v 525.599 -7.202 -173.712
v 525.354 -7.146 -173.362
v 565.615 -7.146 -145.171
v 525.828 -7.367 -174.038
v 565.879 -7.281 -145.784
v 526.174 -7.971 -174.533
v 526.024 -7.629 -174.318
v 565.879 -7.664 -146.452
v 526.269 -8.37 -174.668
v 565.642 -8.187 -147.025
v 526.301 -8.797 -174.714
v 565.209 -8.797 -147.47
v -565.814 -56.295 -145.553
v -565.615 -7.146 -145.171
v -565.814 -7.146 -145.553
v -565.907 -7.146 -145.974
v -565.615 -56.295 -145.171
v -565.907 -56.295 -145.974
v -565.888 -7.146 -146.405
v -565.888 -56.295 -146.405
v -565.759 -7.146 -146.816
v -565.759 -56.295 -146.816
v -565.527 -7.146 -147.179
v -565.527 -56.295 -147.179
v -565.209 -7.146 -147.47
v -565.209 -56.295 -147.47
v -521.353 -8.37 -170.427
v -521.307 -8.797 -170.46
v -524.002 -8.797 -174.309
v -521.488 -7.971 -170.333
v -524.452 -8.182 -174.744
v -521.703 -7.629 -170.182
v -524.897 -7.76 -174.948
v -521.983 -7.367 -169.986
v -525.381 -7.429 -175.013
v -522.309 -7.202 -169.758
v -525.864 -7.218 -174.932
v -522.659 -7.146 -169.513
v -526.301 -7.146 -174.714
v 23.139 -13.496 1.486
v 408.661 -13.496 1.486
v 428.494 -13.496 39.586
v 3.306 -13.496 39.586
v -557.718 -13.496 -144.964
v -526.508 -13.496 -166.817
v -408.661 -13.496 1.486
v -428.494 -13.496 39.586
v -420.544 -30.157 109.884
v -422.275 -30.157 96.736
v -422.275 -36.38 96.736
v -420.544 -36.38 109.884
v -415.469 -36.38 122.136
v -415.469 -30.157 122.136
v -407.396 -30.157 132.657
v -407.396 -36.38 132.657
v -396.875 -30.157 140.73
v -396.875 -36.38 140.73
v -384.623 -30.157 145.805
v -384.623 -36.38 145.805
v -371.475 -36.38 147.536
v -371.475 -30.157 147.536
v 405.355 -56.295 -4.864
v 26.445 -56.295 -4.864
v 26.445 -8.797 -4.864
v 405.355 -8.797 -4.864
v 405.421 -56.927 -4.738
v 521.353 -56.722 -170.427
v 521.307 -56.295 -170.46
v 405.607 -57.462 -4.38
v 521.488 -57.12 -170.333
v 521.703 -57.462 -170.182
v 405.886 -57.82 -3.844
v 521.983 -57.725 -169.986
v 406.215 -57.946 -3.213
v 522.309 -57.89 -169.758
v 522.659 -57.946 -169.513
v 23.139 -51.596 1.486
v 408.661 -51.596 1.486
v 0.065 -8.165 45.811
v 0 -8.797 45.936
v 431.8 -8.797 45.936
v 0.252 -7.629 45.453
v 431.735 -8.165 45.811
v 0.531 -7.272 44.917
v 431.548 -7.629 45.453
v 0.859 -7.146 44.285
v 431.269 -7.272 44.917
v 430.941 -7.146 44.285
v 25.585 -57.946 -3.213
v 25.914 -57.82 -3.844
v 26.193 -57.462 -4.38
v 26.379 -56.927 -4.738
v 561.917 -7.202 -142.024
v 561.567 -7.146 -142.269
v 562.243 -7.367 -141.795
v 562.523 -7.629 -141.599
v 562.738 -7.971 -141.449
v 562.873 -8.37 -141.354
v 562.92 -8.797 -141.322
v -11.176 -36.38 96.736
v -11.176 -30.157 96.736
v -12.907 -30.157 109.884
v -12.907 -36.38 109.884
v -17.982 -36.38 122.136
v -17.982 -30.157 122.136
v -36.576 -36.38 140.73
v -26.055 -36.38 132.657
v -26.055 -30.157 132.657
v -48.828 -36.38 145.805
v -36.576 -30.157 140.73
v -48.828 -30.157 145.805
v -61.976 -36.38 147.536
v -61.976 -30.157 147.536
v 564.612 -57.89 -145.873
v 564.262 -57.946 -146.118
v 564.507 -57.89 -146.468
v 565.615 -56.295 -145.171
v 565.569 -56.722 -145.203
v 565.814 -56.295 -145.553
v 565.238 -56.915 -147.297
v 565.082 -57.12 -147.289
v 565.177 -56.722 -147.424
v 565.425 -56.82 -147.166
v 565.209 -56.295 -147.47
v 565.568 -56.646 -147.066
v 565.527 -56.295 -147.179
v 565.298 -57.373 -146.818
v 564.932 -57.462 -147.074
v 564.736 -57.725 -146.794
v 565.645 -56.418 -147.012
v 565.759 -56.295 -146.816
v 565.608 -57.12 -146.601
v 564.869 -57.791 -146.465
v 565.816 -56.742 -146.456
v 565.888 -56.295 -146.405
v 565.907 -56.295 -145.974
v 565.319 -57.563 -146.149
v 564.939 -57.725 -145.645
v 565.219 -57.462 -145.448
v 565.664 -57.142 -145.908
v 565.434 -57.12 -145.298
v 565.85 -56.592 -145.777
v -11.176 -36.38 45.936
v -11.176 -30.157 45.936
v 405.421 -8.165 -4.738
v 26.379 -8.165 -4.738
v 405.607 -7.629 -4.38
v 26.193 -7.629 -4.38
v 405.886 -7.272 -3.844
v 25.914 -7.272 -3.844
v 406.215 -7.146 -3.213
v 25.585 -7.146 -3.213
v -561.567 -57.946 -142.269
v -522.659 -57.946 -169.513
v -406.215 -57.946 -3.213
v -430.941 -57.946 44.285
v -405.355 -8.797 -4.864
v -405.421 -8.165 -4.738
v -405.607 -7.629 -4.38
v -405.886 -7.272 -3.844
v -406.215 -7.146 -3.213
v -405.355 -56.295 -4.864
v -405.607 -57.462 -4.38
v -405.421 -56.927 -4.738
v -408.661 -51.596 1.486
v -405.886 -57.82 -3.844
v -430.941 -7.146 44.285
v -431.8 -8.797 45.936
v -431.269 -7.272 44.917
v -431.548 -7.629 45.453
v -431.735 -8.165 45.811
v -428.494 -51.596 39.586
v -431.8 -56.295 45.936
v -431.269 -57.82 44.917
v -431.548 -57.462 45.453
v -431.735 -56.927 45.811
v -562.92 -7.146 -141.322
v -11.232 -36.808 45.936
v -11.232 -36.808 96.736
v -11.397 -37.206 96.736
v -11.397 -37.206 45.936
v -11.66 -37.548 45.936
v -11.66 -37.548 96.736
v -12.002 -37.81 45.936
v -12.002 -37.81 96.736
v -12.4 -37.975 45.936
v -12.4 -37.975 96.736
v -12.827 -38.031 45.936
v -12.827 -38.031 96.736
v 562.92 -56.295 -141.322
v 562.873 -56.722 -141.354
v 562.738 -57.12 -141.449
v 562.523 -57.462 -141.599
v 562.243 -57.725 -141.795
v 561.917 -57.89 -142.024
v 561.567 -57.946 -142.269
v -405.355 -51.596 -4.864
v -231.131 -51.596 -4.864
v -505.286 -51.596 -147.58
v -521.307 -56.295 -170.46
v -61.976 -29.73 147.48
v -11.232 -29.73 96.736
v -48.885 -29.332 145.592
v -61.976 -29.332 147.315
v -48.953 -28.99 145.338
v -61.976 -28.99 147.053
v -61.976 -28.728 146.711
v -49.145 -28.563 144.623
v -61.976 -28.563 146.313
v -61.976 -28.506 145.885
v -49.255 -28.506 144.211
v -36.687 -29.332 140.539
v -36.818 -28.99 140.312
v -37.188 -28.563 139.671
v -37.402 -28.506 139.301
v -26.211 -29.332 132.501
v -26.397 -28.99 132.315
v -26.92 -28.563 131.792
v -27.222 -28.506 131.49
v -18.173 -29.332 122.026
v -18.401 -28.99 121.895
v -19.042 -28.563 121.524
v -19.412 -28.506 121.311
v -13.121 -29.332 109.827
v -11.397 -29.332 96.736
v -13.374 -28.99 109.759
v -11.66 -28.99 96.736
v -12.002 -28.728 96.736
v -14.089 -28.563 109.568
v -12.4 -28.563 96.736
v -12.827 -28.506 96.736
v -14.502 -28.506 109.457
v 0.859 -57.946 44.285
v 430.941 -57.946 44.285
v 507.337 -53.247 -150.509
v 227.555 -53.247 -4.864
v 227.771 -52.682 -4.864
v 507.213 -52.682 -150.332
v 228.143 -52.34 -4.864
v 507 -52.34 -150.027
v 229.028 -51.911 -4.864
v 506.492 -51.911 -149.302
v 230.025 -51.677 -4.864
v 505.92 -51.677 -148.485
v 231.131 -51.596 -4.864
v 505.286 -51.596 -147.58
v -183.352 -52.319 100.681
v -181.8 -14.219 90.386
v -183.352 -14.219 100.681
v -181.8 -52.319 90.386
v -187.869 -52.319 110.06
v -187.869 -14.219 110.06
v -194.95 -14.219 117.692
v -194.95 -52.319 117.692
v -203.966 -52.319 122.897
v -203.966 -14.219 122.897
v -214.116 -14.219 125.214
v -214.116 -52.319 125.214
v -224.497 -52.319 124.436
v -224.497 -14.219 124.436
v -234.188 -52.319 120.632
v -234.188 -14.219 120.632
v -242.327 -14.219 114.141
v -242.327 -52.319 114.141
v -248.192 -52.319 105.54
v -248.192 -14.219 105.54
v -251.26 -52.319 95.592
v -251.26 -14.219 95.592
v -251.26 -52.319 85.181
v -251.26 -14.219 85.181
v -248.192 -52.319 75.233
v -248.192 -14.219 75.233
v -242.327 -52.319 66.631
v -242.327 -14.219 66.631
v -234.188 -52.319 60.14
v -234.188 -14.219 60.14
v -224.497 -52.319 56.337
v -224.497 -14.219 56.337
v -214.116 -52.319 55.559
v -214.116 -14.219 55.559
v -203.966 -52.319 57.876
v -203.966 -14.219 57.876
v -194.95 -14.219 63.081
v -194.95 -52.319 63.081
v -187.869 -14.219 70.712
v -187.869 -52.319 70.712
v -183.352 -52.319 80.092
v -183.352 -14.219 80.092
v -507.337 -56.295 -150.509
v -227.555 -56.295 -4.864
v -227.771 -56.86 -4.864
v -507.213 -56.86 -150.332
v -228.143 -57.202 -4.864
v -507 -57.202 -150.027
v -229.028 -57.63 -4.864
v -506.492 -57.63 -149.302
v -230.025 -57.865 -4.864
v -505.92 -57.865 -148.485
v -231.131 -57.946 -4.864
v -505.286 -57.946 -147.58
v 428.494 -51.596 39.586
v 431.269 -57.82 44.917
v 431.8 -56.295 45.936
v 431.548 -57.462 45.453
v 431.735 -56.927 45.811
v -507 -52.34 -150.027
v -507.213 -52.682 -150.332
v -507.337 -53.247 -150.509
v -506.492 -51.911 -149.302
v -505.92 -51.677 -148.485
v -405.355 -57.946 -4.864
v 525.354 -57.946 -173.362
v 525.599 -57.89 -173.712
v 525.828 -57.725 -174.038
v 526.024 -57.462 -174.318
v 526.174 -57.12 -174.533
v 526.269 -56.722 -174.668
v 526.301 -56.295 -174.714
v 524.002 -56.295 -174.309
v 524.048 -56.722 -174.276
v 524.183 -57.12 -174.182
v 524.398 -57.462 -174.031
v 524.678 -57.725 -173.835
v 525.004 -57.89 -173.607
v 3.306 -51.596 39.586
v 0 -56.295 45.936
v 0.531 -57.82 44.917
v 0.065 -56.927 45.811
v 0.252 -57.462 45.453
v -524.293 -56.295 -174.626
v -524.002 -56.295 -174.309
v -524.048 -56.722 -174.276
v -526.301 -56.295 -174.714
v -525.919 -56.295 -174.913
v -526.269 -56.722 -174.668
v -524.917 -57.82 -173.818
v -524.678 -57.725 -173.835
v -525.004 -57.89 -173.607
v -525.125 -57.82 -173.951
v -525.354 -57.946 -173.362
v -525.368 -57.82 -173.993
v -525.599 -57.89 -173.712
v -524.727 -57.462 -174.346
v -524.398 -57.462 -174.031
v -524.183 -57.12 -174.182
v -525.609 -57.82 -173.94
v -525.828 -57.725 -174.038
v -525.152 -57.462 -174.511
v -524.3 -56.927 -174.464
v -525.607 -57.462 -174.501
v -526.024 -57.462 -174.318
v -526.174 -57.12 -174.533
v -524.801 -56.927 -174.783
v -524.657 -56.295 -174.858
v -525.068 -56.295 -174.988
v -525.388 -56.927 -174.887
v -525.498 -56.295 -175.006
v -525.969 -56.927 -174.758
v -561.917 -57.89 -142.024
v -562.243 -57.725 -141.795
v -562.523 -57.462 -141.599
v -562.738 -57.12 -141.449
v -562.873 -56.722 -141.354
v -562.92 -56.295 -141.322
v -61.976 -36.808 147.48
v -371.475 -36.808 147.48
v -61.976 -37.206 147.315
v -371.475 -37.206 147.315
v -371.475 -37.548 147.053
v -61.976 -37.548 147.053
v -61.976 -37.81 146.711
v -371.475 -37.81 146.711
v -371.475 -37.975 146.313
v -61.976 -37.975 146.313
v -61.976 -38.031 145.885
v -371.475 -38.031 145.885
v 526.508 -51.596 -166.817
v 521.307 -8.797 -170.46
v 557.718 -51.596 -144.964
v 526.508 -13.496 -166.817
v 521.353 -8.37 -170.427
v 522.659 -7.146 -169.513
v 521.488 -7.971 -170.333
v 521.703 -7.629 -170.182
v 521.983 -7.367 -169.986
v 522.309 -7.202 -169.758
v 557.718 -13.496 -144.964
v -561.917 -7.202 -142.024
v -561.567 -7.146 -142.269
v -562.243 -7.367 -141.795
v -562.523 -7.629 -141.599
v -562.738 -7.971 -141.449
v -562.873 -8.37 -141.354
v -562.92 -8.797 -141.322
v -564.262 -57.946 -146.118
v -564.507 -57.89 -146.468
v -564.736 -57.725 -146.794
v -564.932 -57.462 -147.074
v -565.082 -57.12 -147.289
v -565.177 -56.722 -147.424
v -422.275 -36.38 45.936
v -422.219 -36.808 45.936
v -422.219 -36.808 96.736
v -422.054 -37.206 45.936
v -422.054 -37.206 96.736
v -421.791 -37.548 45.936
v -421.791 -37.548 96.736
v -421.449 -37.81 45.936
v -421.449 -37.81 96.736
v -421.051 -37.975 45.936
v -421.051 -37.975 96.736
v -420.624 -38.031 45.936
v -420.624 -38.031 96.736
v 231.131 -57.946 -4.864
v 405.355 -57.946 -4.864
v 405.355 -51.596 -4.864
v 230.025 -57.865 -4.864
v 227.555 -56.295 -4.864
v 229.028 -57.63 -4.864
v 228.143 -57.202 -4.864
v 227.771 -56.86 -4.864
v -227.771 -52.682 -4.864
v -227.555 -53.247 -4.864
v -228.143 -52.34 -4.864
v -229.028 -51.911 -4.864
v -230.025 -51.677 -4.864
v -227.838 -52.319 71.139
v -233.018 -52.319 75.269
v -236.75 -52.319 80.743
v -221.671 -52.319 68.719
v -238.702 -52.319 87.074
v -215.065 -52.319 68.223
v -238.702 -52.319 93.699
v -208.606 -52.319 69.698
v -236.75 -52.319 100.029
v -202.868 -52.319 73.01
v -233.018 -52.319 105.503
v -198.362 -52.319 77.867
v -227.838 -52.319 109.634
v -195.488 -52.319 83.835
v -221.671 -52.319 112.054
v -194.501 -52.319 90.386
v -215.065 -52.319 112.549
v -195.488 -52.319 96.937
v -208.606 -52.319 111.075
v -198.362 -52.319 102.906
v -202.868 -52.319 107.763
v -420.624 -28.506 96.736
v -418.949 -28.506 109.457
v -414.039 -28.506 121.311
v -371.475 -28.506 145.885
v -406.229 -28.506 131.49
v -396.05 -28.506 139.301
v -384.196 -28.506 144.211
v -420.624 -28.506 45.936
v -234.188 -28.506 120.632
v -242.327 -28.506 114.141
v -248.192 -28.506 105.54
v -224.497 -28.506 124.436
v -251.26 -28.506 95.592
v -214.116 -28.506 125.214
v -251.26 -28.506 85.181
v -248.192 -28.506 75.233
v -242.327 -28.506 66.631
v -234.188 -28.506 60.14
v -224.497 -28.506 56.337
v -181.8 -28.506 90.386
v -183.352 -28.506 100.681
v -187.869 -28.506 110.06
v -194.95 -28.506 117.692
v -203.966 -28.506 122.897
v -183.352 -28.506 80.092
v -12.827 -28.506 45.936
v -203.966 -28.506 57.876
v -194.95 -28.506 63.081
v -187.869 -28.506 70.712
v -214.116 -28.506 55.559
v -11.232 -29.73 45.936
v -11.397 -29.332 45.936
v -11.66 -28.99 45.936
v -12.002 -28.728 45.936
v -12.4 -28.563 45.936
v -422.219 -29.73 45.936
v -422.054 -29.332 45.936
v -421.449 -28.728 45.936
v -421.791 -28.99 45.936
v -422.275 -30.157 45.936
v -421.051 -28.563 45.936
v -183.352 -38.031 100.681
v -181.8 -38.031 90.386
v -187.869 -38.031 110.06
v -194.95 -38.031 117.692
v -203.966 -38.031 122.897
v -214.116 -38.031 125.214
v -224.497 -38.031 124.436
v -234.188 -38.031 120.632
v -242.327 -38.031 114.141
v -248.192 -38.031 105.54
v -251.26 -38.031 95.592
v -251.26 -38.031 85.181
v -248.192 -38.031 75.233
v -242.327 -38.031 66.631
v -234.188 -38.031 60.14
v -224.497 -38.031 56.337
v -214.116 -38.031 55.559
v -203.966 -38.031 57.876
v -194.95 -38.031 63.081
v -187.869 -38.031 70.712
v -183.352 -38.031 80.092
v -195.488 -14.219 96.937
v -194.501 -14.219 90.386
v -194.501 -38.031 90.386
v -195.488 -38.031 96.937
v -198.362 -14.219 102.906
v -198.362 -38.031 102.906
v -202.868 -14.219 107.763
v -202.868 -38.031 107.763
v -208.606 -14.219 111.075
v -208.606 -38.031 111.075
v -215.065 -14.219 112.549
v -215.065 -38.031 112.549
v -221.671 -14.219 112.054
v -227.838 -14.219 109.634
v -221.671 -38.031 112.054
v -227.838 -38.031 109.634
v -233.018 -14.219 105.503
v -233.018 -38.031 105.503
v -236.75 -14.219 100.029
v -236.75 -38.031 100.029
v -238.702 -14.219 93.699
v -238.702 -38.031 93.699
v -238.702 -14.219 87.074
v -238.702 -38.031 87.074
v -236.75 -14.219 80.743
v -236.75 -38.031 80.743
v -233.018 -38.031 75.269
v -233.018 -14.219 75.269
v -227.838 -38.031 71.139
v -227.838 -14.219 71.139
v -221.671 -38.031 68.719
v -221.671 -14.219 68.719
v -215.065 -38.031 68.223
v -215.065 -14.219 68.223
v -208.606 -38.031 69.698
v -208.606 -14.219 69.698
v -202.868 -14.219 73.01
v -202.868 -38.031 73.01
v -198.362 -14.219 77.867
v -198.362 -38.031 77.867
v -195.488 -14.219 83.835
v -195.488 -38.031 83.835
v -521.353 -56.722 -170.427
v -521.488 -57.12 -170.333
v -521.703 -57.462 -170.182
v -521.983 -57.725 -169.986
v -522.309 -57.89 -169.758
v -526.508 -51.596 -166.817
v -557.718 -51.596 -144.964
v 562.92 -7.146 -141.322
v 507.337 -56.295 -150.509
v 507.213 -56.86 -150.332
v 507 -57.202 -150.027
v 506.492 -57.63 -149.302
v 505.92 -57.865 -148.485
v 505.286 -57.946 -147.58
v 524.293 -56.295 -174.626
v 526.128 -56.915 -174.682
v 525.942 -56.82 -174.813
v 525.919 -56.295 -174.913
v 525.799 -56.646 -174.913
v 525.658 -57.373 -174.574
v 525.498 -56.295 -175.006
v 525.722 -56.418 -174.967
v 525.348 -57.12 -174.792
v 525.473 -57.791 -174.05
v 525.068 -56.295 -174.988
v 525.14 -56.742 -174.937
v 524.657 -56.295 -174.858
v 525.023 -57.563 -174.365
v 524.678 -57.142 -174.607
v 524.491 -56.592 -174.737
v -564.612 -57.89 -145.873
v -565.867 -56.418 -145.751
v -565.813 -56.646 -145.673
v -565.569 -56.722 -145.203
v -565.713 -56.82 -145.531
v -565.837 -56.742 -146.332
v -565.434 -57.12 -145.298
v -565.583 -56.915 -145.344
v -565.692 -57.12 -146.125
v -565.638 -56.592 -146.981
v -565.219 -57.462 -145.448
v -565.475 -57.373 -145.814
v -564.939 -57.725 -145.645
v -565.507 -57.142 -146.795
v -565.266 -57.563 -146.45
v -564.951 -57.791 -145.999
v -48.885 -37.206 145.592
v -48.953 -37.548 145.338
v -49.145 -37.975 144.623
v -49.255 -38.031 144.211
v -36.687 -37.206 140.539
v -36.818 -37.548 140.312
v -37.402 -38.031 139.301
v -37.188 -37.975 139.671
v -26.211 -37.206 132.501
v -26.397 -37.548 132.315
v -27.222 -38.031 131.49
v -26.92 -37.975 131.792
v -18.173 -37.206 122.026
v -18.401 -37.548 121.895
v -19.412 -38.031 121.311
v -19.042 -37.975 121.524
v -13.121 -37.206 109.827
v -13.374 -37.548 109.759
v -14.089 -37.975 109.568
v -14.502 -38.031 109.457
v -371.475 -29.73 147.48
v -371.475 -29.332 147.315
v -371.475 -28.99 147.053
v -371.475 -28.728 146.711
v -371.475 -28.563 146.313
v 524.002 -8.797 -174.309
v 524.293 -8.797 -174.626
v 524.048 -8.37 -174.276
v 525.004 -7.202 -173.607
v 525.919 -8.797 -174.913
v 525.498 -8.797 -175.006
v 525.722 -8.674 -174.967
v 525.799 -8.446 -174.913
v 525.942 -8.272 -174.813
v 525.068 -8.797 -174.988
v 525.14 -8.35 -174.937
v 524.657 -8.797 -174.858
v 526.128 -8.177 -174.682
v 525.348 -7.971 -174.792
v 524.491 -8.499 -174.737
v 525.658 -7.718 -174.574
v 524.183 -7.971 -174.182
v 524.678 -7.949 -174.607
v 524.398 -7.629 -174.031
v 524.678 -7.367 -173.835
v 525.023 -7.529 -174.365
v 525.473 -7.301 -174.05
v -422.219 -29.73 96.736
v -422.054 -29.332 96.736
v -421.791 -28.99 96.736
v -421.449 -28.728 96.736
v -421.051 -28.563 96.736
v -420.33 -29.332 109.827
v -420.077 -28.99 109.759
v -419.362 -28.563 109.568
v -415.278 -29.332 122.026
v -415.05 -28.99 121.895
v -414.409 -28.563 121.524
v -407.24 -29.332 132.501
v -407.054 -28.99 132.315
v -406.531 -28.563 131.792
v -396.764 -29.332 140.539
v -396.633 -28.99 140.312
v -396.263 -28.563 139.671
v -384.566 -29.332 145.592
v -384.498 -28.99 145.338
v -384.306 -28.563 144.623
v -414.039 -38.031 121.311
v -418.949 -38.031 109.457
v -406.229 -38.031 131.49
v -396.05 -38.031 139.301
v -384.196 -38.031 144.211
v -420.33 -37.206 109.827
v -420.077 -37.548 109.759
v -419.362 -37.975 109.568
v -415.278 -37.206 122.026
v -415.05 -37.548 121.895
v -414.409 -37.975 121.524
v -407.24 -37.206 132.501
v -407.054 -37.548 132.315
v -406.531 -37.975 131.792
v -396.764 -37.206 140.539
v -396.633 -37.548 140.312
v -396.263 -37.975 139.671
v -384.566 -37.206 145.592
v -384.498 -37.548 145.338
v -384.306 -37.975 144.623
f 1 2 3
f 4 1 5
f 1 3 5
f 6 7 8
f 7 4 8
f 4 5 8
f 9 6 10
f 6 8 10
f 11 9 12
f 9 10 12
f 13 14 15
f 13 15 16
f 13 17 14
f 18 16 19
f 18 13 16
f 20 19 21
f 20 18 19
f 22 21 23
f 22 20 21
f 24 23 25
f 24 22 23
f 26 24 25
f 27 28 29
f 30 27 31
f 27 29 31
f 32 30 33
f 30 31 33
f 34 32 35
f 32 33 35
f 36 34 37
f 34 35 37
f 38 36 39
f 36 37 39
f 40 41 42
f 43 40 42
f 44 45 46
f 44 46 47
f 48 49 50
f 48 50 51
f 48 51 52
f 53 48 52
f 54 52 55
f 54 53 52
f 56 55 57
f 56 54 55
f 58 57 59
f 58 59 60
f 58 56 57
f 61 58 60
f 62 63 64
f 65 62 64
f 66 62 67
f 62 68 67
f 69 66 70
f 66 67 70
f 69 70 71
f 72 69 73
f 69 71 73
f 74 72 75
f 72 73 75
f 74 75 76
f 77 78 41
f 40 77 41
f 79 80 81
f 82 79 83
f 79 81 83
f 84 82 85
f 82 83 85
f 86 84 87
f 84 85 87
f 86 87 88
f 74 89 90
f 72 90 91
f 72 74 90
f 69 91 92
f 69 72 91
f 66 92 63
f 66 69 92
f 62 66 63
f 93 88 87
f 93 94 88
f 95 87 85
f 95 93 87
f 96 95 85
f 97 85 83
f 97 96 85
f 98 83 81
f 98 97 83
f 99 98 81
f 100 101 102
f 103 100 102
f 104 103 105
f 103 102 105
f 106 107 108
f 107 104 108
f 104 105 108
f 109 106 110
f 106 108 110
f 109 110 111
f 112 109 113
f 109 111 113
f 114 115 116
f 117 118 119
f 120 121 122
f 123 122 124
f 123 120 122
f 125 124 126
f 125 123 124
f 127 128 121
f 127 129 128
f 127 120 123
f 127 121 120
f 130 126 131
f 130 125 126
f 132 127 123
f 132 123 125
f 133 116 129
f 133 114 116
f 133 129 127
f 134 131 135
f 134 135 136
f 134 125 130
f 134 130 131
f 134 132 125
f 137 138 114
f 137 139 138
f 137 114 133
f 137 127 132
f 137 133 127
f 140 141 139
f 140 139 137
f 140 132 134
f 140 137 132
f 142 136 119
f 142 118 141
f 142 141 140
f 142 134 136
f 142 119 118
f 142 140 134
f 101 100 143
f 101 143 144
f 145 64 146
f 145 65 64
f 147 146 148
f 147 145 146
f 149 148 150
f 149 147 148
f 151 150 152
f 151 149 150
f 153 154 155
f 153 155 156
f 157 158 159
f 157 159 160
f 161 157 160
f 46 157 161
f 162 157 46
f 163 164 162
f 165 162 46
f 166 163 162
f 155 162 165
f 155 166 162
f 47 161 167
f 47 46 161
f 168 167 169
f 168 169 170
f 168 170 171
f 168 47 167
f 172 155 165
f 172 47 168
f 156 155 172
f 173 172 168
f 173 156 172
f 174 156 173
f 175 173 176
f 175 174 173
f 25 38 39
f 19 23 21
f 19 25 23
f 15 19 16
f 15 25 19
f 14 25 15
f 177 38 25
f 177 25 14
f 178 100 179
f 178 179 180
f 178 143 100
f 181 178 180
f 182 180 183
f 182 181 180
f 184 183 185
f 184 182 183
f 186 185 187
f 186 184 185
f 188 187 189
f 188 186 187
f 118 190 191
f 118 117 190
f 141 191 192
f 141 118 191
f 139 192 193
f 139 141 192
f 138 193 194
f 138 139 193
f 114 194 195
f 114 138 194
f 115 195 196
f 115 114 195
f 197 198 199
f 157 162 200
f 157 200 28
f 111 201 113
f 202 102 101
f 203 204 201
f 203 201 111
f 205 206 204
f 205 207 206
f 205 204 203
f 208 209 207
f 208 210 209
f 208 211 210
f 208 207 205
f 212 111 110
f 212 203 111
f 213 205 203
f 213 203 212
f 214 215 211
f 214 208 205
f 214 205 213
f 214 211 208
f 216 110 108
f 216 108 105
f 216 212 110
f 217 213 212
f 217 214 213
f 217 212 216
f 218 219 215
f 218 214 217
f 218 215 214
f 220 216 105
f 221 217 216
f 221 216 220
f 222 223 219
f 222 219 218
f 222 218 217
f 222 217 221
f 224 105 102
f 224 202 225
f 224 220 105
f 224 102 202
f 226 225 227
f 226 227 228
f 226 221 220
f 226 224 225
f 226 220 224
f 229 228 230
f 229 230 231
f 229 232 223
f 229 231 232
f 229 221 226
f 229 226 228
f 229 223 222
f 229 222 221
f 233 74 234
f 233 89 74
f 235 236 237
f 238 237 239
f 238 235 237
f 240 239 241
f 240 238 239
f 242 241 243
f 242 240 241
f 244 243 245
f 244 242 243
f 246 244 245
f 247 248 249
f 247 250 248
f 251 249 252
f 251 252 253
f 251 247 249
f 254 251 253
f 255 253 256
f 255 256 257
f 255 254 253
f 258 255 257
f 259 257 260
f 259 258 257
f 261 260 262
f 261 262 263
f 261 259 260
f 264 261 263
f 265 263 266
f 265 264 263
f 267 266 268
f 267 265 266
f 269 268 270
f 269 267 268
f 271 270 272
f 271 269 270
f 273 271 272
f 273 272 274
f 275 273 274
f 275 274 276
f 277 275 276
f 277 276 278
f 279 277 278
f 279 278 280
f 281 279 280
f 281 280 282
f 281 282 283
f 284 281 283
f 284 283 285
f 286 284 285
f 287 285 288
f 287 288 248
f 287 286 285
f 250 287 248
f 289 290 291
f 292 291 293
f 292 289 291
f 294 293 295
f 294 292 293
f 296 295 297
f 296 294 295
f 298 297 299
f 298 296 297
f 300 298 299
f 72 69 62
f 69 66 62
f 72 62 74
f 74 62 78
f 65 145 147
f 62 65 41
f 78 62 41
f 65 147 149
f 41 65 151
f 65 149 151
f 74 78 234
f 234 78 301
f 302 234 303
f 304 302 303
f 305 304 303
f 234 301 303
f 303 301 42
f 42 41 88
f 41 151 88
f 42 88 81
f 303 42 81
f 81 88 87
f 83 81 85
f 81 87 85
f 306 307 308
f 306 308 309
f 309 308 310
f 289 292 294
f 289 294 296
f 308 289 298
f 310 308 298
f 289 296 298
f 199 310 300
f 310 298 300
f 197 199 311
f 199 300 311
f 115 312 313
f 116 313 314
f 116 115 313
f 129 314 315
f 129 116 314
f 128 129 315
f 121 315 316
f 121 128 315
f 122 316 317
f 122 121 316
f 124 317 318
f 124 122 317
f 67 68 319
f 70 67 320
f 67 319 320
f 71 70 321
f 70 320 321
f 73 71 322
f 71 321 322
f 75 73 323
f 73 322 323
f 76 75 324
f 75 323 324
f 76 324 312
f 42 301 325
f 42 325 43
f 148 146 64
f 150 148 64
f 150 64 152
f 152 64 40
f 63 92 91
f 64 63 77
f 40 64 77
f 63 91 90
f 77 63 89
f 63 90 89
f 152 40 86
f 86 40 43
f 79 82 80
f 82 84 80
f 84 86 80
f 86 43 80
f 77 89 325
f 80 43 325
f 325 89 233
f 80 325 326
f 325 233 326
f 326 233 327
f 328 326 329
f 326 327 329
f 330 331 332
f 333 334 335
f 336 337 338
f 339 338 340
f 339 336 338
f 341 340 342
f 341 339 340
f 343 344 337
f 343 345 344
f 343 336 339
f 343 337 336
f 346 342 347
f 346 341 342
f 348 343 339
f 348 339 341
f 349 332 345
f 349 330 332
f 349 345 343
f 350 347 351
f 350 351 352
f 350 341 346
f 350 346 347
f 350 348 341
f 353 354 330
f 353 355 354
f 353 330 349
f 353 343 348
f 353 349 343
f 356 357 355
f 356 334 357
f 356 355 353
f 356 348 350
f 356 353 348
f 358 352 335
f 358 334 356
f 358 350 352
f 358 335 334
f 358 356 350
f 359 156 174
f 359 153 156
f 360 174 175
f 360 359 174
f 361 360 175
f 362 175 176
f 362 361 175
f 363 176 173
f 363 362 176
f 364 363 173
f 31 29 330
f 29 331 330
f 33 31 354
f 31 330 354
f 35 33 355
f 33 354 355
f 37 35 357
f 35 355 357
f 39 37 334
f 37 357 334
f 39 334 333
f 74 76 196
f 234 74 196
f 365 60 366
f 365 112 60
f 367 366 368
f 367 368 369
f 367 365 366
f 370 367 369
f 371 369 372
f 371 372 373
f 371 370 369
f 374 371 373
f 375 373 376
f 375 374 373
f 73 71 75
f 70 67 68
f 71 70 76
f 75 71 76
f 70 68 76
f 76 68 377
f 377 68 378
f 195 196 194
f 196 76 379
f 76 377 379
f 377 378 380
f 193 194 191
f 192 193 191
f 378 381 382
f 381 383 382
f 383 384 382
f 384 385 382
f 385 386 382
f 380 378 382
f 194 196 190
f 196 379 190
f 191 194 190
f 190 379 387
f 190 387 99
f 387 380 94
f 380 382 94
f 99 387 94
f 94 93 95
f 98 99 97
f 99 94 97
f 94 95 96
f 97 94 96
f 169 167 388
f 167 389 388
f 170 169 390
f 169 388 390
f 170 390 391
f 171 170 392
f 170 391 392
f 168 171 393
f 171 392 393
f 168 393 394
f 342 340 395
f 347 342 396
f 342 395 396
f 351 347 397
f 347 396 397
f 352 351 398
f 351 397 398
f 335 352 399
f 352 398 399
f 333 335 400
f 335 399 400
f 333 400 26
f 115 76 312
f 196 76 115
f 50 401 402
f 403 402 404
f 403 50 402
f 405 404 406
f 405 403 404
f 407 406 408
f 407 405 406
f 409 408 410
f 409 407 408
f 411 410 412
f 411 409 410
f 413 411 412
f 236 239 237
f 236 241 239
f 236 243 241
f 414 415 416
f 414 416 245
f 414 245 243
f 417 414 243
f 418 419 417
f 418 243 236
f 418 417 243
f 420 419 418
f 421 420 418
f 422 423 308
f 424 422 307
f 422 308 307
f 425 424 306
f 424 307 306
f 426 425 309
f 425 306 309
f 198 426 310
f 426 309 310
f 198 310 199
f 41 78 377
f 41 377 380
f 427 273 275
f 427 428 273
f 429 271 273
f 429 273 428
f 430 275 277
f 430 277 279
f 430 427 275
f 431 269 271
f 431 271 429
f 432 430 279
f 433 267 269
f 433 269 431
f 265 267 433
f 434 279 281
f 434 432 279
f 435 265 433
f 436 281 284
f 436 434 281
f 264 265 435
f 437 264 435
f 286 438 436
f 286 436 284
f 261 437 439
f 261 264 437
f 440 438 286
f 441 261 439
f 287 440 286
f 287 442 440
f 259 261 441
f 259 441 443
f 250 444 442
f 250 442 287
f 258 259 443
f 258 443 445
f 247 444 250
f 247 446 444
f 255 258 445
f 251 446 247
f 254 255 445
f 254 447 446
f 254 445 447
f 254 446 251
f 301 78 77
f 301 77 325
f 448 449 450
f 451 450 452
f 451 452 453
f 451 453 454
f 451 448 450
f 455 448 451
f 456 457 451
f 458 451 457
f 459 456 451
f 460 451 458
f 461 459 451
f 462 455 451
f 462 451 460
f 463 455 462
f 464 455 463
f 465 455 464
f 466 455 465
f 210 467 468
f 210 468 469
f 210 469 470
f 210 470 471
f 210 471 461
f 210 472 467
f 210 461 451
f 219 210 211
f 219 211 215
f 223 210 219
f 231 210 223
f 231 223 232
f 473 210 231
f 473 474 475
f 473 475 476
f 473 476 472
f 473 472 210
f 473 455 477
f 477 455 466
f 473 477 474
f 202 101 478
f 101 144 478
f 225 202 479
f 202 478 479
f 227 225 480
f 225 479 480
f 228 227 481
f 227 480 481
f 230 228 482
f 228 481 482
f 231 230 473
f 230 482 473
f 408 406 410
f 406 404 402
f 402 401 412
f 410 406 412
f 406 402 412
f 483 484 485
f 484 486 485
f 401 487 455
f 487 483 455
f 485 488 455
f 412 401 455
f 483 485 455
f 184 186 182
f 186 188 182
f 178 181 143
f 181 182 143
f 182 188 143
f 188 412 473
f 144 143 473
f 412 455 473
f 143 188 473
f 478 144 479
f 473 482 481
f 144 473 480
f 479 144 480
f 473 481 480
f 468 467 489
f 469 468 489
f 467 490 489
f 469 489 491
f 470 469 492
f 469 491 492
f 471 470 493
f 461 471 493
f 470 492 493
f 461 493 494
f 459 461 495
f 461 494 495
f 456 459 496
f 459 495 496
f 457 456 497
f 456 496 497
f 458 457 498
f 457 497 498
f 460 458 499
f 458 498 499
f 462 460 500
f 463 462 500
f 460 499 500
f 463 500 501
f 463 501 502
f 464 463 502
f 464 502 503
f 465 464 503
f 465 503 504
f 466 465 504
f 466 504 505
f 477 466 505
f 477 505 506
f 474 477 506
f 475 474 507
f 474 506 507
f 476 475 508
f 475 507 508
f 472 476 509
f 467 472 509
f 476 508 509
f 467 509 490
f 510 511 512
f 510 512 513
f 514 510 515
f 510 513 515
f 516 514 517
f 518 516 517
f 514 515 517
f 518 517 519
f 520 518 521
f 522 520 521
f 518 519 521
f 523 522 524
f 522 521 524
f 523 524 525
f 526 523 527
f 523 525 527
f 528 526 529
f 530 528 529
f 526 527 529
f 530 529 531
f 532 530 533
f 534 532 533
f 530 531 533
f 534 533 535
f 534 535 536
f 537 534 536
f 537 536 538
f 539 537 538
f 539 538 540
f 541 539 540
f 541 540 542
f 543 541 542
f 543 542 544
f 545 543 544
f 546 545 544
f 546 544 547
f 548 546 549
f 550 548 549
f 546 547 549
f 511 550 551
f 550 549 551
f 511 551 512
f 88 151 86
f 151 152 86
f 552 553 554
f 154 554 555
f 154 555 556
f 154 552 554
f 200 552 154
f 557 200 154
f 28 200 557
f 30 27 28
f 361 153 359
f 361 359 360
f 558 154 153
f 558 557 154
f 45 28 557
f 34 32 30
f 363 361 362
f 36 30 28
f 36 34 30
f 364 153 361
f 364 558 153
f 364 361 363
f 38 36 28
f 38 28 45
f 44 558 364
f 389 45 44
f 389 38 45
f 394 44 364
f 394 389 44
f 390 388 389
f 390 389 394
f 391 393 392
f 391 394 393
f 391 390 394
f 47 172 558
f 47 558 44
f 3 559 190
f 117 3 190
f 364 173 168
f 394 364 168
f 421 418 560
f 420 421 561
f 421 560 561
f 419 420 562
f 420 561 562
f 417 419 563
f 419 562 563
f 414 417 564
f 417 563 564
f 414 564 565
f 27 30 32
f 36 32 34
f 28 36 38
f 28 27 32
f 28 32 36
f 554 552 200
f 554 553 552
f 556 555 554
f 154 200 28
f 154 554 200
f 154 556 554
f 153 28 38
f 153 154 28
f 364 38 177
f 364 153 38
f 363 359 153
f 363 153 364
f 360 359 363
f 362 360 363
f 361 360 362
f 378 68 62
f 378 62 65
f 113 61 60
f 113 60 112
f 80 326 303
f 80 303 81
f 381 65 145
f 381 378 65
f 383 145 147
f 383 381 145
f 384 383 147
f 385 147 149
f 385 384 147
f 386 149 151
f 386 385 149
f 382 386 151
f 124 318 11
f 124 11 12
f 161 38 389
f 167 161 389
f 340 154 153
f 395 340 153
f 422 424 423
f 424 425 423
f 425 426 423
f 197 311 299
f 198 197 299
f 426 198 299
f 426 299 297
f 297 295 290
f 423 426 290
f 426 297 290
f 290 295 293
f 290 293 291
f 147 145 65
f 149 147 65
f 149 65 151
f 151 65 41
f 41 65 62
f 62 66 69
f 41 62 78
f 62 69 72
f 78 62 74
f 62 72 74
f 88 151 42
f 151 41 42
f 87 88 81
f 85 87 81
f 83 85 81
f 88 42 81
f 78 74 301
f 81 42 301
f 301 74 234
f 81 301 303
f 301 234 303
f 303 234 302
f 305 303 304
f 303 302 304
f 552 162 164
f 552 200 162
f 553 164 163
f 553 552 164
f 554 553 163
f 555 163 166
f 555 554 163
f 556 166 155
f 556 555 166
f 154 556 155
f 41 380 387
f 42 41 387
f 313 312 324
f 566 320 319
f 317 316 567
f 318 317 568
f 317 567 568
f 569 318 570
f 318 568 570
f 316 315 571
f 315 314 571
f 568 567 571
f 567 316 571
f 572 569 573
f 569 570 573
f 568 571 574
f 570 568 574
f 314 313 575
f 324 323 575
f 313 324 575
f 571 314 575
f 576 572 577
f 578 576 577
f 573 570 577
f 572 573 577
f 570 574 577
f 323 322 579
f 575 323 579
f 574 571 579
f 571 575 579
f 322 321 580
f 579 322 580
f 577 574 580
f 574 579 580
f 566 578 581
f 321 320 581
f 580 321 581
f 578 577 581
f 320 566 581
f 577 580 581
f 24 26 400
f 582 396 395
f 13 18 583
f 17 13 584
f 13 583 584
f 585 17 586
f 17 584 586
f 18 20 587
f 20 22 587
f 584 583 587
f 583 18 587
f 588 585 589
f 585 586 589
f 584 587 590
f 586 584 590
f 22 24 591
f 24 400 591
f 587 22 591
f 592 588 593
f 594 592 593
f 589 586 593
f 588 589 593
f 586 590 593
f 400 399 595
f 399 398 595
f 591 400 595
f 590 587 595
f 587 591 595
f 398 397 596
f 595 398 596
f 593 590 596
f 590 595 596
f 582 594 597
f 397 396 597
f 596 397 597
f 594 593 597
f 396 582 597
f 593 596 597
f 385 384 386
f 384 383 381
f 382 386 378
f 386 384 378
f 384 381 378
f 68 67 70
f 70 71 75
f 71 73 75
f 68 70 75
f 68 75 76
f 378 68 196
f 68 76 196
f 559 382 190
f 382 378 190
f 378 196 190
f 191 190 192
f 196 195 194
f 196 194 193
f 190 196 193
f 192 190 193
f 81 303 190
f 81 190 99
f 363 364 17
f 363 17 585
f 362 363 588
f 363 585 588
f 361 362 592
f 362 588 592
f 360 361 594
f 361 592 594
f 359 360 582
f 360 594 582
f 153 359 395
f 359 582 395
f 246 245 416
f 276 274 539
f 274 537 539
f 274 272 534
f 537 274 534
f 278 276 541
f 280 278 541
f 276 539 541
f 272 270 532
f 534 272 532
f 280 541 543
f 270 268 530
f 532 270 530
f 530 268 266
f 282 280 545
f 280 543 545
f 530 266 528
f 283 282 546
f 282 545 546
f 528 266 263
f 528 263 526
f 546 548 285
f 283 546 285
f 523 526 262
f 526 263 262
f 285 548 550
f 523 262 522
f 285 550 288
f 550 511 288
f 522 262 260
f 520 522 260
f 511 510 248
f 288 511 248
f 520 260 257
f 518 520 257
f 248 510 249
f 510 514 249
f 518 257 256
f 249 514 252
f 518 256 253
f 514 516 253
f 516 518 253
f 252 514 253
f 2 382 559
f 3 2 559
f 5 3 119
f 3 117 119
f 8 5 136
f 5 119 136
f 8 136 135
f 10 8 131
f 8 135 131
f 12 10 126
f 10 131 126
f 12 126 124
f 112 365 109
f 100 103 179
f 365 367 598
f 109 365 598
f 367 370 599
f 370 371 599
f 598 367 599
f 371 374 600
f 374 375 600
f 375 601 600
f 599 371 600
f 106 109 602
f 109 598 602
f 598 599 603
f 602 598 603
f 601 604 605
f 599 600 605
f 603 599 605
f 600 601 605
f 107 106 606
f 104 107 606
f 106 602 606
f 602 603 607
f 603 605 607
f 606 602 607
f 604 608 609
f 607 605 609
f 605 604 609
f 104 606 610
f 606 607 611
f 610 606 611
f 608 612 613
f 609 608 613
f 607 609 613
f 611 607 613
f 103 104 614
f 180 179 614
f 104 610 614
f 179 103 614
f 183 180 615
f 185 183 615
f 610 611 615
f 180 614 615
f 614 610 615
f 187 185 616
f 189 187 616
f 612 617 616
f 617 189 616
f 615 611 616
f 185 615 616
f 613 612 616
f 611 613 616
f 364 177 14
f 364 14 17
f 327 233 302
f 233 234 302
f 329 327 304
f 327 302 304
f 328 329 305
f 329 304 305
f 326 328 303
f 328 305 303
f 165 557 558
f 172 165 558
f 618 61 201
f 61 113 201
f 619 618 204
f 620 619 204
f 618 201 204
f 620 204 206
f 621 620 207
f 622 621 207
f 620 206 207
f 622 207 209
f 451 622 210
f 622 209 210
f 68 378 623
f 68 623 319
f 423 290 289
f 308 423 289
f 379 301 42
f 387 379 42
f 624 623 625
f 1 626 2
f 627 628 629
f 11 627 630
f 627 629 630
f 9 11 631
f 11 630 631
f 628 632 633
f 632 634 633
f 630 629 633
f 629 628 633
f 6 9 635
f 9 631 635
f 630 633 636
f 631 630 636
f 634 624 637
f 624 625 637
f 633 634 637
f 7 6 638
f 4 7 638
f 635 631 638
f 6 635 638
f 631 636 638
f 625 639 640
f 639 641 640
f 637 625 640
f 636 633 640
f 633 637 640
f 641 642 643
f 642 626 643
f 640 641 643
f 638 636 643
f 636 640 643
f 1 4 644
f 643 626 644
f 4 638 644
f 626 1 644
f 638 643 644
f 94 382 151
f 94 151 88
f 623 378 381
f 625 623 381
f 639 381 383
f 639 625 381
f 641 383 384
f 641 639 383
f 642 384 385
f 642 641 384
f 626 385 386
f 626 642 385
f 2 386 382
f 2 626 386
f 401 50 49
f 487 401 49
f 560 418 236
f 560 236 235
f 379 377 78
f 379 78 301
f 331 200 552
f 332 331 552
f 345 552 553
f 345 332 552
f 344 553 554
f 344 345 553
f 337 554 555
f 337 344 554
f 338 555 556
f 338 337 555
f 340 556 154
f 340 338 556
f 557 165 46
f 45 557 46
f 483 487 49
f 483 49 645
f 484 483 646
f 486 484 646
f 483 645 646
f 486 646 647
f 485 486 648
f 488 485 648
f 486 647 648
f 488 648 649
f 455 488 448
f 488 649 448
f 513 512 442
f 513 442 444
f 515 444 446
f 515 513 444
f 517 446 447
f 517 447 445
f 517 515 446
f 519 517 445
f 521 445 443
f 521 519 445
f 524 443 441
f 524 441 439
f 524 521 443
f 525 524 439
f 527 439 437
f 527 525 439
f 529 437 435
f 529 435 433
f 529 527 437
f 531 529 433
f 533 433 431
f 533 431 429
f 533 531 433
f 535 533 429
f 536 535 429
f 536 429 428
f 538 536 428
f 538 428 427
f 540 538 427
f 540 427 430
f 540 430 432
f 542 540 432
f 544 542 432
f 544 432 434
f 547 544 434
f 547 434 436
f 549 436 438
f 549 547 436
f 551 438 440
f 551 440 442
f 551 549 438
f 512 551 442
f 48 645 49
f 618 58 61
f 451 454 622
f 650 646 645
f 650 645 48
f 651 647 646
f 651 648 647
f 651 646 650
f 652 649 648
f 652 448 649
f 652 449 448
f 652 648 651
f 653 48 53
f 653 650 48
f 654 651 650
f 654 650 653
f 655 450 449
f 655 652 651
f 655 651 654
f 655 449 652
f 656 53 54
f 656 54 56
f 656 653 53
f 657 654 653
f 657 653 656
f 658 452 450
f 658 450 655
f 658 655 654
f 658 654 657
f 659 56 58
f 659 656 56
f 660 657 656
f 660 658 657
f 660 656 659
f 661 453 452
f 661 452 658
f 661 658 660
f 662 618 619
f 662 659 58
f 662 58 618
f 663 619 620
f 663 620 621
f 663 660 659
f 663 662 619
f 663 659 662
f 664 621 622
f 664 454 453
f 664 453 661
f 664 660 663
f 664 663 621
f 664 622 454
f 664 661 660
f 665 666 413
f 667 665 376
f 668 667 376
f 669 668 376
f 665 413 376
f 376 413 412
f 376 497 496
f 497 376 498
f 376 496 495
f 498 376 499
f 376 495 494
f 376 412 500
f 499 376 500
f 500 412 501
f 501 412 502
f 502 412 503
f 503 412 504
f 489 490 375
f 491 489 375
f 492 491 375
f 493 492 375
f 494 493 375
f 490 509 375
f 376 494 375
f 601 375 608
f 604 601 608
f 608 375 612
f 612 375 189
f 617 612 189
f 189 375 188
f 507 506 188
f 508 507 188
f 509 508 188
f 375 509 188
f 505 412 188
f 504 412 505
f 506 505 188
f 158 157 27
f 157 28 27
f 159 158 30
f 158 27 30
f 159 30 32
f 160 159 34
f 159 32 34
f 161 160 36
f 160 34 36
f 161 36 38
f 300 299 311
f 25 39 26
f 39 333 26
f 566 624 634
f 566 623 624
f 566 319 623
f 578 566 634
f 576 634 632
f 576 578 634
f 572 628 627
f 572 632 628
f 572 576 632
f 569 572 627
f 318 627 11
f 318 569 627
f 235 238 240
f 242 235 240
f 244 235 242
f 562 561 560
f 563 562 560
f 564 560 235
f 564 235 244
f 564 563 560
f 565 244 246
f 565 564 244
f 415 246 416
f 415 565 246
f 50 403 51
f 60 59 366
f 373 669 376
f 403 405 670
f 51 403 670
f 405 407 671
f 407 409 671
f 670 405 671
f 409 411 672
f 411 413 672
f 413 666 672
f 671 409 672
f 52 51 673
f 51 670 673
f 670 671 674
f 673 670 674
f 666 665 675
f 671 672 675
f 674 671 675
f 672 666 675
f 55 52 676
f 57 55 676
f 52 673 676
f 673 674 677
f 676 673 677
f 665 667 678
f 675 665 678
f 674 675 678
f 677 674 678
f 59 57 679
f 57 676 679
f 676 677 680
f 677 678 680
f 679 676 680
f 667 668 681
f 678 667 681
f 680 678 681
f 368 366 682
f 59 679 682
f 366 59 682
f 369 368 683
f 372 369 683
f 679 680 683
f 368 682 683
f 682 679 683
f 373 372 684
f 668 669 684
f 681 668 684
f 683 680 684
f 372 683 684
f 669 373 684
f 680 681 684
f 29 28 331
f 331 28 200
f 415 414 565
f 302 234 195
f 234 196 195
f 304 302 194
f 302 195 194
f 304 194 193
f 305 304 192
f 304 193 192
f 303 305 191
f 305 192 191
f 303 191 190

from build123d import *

# Parameters (mm, degrees)
F0_W           = 50.8
F0_H           = 50.8
F0_W_2         = 38.1
F0_H_2         = 38.1
F1_DEPTH       = 431.8
F3_DEPTH       = 50.801
F6_W           = 50.8
F6_H           = 50.8
F6_W_2         = 38.1
F6_H_2         = 38.1
F7_DEPTH       = 228.6
F9_DEPTH       = 50.801
F11_DEPTH      = 6.35
F12_W          = 50.8
F12_H          = 50.8
F12_W_2        = 38.1
F12_H_2        = 38.1
F13_DEPTH      = 6.35
F15_W          = 411.099
F15_H          = 9.525
F16_DEPTH      = 101.6
F17_R          = 50.8
F18_R          = 22.225
F19_DEPTH      = 25.4
F20_R          = 34.925
F20_R_2        = 22.225
F21_DEPTH      = 14.2875
F21_DEPTH_BACK = 23.8125
F24_DEPTH      = 50.801
F26_R          = 1.651
F26_2_R        = 1.651
F26_3_R        = 1.651
F26_4_R        = 1.651
F26_5_R        = 1.651
F26_6_R        = 1.651
F26_7_R        = 1.651
F26_8_R        = 1.651


with BuildPart() as f1:
    # F0 (on Right) → F1 (new body)
    with BuildSketch(Plane.YZ):
        with Locations((-32.5458780862, 20.5363309942)):
            Rectangle(F0_W, F0_H)
        with Locations((-32.5458780862, 20.5363309942)):
            Rectangle(F0_W_2, F0_H_2, mode=Mode.SUBTRACT)
    extrude(amount=F1_DEPTH)

    # F2 (on face) → F3 (cut, through all)
    with BuildSketch(Plane(origin=(0, -7.1458780862, 0), x_dir=(-1, 0, 0), z_dir=(0, 1, 0))):
        Polygon((-405.355193832, -4.8636690058), (-431.8, 45.9363309942), (-431.8, -4.8636690058), align=None)
    extrude(amount=-F3_DEPTH, mode=Mode.SUBTRACT)


with BuildPart() as f7:
    # F6 (on face) → F7 (new body)
    with BuildSketch(Plane(origin=(120.4748354254, 0, -172.0558960753), x_dir=(0.8191520443, 0, 0.5735764364), z_dir=(-0.5735764364, 0, 0.8191520443))):
        with Locations((354.6578497547, -32.5458780862)):
            Rectangle(F6_W, F6_H)
        with Locations((354.6578497547, -32.5458780862)):
            Rectangle(F6_W_2, F6_H_2, mode=Mode.SUBTRACT)
    extrude(amount=-F7_DEPTH)

    # F8 (on face) → F9 (cut, through all)
    with BuildSketch(Plane.XZ.offset(57.9458780862)):
        Polygon((405.355193832, -4.8636690058), (431.8, 45.9363309942), (390.1870761501, 16.7986480276), align=None)
    extrude(amount=-F9_DEPTH, mode=Mode.SUBTRACT)


with BuildPart() as f11:
    # F10 (on face) → F11 (new body)
    with BuildSketch(Plane.XZ.offset(57.9458780862)):
        Polygon((405.355193832, -4.8636690058), (227.555193832, -4.8636690058), (507.3370842152, -150.5089024804), align=None)
    extrude(amount=-F11_DEPTH)


with BuildPart() as f13:
    # F12 (on face) → F13 (new body)
    with BuildSketch(Plane(origin=(251.5944087752, 0, -359.3140533998), x_dir=(0.8191520443, 0, 0.5735764364), z_dir=(0.5735764364, 0, -0.8191520443))):
        with Locations((354.6578497547, 32.5458780862)):
            Rectangle(F12_W, F12_H)
        with Locations((354.6578497547, 32.5458780862)):
            Rectangle(F12_W_2, F12_H_2, mode=Mode.SUBTRACT)
        with Locations((354.6578497547, 32.5458780862)):
            Rectangle(F12_W_2, F12_H_2)
    extrude(amount=F13_DEPTH)


with BuildPart() as f14_1:
    # F14: instance of F7
    add(f7.part.mirror(Plane(origin=(0, -32.5458780862, 20.5363309942), x_dir=(0, 1, 0), z_dir=(-1, 0, 0))))

    # F26#2
    f26_2_edges = [f14_1.edges().sort_by_distance(p)[0] for p in [
        (-463.330922, -7.145878, -87.661589),
        (-463.330922, -57.945878, -87.661589),
        (-497.359787, -57.945878, -47.692748),
        (-497.359787, -7.145878, -47.692748),
    ]]
    fillet(f26_2_edges, radius=F26_2_R)


with BuildPart() as f14_2:
    # F14: instance of F1
    add(f1.part.mirror(Plane(origin=(0, -32.5458780862, 20.5363309942), x_dir=(0, 1, 0), z_dir=(-1, 0, 0))))


with BuildPart() as f14_3:
    # F14: instance of F11
    add(f11.part.mirror(Plane(origin=(0, -32.5458780862, 20.5363309942), x_dir=(0, 1, 0), z_dir=(-1, 0, 0))))

    # F26
    f26_edges = [f14_3.edges().sort_by_distance(p)[0] for p in [
        (-367.446139, -57.945878, -77.686286),
        (-367.446139, -51.595878, -77.686286),
    ]]
    fillet(f26_edges, radius=F26_R)


with BuildPart() as f14_4:
    # F14: instance of F13
    add(f13.part.mirror(Plane(origin=(0, -32.5458780862, 20.5363309942), x_dir=(0, 1, 0), z_dir=(-1, 0, 0))))

    # F26#3
    f26_3_edges = [f14_4.edges().sort_by_distance(p)[0] for p in [
        (-524.94886, -32.545878, -175.661125),
        (-523.127755, -57.945878, -173.060317),
        (-545.755322, -57.945878, -161.092283),
        (-523.127755, -7.145878, -173.060317),
        (-566.561784, -32.545878, -146.523442),
        (-564.740679, -57.945878, -143.922634),
    ]]
    fillet(f26_3_edges, radius=F26_3_R)


with BuildPart() as f16:
    # F15 (on face) → F16 (new body)
    with BuildSketch(Plane.XY.offset(45.9363309942)):
        with Locations((-216.7255, -33.2689601928)):
            Rectangle(F15_W, F15_H)
    extrude(amount=F16_DEPTH)

    # F17
    f17_edges = [f16.edges().sort_by_distance(p)[0] for p in [
        (-422.275, -33.26896, 147.536331),
        (-11.176, -33.26896, 147.536331),
    ]]
    fillet(f17_edges, radius=F17_R)

    # F18 (on face) → F19 (cut)
    with BuildSketch(Plane.XZ.offset(38.0314601928)):
        with Locations((-216.7255, 90.3863309942)):
            Circle(F18_R)
    extrude(amount=-F19_DEPTH, mode=Mode.SUBTRACT)


with BuildPart() as f21:
    # F20 (on face) → F21 (new body, two sides)
    with BuildSketch(Plane.XZ.offset(38.0314601928)) as f21_sk:
        with Locations((-216.7255, 90.3863309942)):
            Circle(F20_R)
        with Locations((-216.7255, 90.3863309942)):
            Circle(F20_R_2, mode=Mode.SUBTRACT)
    extrude(amount=F21_DEPTH)
    extrude(f21_sk.sketch, amount=-F21_DEPTH_BACK)


with BuildPart() as f16_1:
    add(f16.part)

    # F22: cut F21
    add(f21.part, mode=Mode.SUBTRACT)

    # F26#4
    f26_4_edges = [f16_1.edges().sort_by_distance(p)[0] for p in [
        (-422.275, -28.50646, 71.336331),
        (-422.275, -38.03146, 71.336331),
        (-407.396024, -28.50646, 132.657355),
        (-407.396024, -38.03146, 132.657355),
    ]]
    fillet(f26_4_edges, radius=F26_4_R)


with BuildPart() as f1_1:
    add(f1.part)

    # F23 (on face) → F24 (cut, through all)
    with BuildSketch(Plane.XZ.offset(57.9458780862)):
        Polygon((26.444806168, -4.8636690058), (0, 45.9363309942), (0, -4.8636690058), align=None)
    extrude(amount=-F24_DEPTH, mode=Mode.SUBTRACT)

    # F26#5
    f26_5_edges = [f1_1.edges().sort_by_distance(p)[0] for p in [
        (215.9, -7.145878, -4.863669),
        (215.9, -7.145878, 45.936331),
        (215.9, -57.945878, 45.936331),
        (215.9, -57.945878, -4.863669),
    ]]
    fillet(f26_5_edges, radius=F26_5_R)


with BuildPart() as f11_1:
    add(f11.part)

    # F26#6
    f26_6_edges = [f11_1.edges().sort_by_distance(p)[0] for p in [
        (367.446139, -57.945878, -77.686286),
        (367.446139, -51.595878, -77.686286),
    ]]
    fillet(f26_6_edges, radius=F26_6_R)


with BuildPart() as f7_1:
    add(f7.part)

    # F26#7
    f26_7_edges = [f7_1.edges().sort_by_distance(p)[0] for p in [
        (463.330922, -57.945878, -87.661589),
        (497.359787, -57.945878, -47.692748),
        (463.330922, -7.145878, -87.661589),
        (497.359787, -7.145878, -47.692748),
    ]]
    fillet(f26_7_edges, radius=F26_7_R)


with BuildPart() as f13_1:
    add(f13.part)

    # F26#8
    f26_8_edges = [f13_1.edges().sort_by_distance(p)[0] for p in [
        (523.127755, -57.945878, -173.060317),
        (523.127755, -7.145878, -173.060317),
        (564.740679, -57.945878, -143.922634),
        (545.755322, -57.945878, -161.092283),
        (524.94886, -32.545878, -175.661125),
        (545.755322, -7.145878, -161.092283),
        (566.561784, -32.545878, -146.523442),
    ]]
    fillet(f26_8_edges, radius=F26_8_R)


solid = Compound([f14_1.part, f14_3.part, f14_4.part, f21.part, f16_1.part, f1_1.part, f11_1.part, f7_1.part, f13_1.part])
